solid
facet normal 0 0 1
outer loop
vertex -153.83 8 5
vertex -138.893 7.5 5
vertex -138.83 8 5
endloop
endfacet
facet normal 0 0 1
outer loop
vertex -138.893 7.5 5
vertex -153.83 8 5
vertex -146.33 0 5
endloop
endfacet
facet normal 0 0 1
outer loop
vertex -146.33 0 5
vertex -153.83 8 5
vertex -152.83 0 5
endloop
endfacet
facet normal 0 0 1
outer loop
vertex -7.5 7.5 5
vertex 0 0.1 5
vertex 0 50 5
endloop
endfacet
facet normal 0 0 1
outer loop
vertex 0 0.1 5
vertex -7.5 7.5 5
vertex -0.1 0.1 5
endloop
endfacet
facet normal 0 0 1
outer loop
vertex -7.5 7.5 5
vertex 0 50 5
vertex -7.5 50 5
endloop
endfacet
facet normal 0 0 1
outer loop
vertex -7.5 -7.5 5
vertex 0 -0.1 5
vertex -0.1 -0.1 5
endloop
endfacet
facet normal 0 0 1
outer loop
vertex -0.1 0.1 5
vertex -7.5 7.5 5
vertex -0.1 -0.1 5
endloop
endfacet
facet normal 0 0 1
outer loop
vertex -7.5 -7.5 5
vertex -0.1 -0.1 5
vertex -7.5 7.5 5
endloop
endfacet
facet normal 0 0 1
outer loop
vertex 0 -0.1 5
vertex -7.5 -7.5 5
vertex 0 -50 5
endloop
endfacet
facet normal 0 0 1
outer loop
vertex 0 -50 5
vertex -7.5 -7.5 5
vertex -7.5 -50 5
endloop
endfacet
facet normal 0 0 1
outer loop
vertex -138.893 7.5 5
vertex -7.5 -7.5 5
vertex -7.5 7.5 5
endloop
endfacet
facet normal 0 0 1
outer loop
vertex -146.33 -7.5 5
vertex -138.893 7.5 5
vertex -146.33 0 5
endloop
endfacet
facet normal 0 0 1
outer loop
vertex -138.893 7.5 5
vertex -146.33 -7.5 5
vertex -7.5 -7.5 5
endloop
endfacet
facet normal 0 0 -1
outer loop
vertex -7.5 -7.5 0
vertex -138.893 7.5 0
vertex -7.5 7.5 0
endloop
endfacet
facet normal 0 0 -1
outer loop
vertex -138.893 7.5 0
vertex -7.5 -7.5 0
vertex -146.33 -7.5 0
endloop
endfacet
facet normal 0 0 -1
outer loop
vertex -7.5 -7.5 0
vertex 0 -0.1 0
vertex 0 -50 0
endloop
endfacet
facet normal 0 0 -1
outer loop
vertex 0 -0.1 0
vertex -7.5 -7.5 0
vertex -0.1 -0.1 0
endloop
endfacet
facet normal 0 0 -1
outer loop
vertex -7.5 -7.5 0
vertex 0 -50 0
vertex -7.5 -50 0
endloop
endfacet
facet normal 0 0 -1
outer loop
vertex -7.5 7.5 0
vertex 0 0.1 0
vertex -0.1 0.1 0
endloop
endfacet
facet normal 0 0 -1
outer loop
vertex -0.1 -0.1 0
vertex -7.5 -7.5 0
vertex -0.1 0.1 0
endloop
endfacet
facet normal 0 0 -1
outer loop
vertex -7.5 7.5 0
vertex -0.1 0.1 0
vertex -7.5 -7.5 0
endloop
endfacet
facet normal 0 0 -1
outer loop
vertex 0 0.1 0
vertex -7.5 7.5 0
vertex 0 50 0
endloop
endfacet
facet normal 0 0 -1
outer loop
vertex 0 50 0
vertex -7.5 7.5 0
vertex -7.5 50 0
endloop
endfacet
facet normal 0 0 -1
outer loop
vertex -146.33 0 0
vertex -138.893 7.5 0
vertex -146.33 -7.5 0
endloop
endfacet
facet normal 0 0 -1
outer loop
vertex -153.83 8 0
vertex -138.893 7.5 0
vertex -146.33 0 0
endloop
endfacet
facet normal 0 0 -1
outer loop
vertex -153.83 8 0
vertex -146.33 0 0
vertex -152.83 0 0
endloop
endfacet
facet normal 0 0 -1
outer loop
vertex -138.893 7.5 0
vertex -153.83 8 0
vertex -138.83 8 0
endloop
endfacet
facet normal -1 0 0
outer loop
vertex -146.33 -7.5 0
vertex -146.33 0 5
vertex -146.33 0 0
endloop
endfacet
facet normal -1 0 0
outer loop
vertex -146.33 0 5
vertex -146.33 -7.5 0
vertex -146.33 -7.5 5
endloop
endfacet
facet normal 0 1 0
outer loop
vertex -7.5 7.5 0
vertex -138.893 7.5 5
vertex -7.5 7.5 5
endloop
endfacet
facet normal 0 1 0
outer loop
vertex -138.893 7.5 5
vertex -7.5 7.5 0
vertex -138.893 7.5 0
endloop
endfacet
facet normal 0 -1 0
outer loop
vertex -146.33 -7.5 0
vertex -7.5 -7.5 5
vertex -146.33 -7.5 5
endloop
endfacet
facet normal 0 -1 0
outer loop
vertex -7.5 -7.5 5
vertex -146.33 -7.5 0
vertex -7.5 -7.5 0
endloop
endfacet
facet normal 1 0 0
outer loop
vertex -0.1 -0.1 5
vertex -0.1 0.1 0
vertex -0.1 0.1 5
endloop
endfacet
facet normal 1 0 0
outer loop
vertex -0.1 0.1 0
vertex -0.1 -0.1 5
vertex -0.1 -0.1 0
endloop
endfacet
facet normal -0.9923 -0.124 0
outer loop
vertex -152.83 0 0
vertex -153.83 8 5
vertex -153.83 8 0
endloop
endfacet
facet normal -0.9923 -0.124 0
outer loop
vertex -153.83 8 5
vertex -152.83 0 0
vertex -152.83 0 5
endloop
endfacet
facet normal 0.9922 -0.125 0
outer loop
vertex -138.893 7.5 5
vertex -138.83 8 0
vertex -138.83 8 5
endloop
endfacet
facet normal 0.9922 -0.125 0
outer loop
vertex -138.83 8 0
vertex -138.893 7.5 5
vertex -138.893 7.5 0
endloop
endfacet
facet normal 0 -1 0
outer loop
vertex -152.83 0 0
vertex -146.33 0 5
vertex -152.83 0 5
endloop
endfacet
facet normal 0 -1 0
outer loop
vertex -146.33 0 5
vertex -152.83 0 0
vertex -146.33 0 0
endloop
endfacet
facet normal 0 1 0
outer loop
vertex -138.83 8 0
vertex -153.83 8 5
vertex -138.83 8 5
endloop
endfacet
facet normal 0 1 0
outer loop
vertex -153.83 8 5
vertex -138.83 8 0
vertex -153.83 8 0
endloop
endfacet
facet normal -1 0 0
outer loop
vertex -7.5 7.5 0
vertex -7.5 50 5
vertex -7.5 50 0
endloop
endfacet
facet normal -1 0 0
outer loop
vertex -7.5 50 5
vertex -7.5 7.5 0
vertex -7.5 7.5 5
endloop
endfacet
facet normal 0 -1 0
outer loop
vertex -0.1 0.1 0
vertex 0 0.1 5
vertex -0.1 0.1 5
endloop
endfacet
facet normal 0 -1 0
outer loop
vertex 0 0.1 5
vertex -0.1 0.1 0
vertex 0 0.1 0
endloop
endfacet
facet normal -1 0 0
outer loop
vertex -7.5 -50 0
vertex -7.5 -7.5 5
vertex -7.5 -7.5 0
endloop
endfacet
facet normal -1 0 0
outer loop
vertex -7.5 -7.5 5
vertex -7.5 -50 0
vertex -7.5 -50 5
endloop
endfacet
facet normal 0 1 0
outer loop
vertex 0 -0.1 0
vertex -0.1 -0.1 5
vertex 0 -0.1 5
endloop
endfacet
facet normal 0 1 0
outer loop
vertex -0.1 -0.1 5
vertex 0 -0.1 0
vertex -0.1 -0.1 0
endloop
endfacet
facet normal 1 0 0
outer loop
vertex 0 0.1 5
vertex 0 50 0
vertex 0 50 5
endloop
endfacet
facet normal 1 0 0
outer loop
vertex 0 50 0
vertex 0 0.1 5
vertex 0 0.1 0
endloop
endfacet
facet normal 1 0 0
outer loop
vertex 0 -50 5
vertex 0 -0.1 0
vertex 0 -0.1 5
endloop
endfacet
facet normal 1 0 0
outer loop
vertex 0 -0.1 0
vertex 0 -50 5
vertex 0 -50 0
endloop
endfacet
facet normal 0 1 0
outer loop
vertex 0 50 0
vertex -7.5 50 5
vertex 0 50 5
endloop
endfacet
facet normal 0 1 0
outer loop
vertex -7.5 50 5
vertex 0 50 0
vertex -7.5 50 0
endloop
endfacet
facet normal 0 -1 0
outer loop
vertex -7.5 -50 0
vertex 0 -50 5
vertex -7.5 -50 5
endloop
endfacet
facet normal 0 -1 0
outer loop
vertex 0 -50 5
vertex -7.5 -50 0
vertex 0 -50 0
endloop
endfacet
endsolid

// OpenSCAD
// file: ../src/model_a_cross_brace.scad
// ============================================
// PiCanvas - 모델 A: 십자 보강재
// ============================================

// --- 공통 파라미터 (center_bracket과 동일) ---
bracket_size = 70;
bracket_thickness = 5;

// LCD 디스플레이
lcd_w = 350.66;
lcd_h = 216.25;
lcd_d = 3.2;

// 프레임
frame_bezel = 3;        // 전면 오버랩
frame_wall = 6;         // 프레임 벽 두께
frame_inner_w = lcd_w;
frame_inner_h = lcd_h;
frame_outer_w = lcd_w + frame_wall * 2;
frame_outer_h = lcd_h + frame_wall * 2;

// 십자 보강재
cross_bar_width = 15;     // 바 너비
cross_bar_thickness = bracket_thickness;  // 브라켓과 동일 두께

// 도브테일 파라미터 (center_bracket과 맞춤)
dt_width = 15;
dt_depth = 8;
dt_taper = 1;  // 사다리꼴 기울기

// --- 모듈 ---

// 도브테일 암 (center_bracket 쪽 연결)
module dovetail_female(height) {
    clearance = 0.2;  // 끼워맞춤 여유
    linear_extrude(height = height)
        polygon([
            [-(dt_width/2 - dt_taper) - clearance, 0],
            [(dt_width/2 - dt_taper) + clearance, 0],
            [dt_width/2 + clearance, dt_depth + clearance],
            [-dt_width/2 - clearance, dt_depth + clearance]
        ]);
}

// 프레임 연결용 도브테일 수 (끝단)
module dovetail_male_end() {
    linear_extrude(height = cross_bar_thickness)
        polygon([
            [-dt_width/2 + dt_taper, 0],
            [dt_width/2 - dt_taper, 0],
            [dt_width/2, dt_depth],
            [-dt_width/2, dt_depth]
        ]);
}

// 수평 바 (좌우, X축 방향)
module horizontal_bar() {
    bar_length_half = frame_outer_w / 2 - bracket_size / 2;

    // 오른쪽 바
    module half_bar() {
        difference() {
            translate([0, -cross_bar_width/2, 0])
                cube([bar_length_half, cross_bar_width, cross_bar_thickness]);

            // 중앙 브라켓 도브테일 암 (빼기)
            translate([0, 0, 0])
                rotate([0, 0, -90])
                    translate([-dt_width/2 - 0.1, -dt_depth - 0.1, -0.5])
                        cube([dt_width + 0.2, dt_depth + 0.2, cross_bar_thickness + 1]);
        }

        // 프레임 연결 도브테일 (끝단)
        translate([bar_length_half, 0, 0])
            dovetail_male_end();
    }

    // 오른쪽
    half_bar();

    // 왼쪽 (미러)
    mirror([1, 0, 0])
        half_bar();
}

// 수직 바 (상하, Y축 방향)
module vertical_bar() {
    bar_length_half = frame_outer_h / 2 - bracket_size / 2;

    module half_bar() {
        difference() {
            translate([-cross_bar_width/2, 0, 0])
                cube([cross_bar_width, bar_length_half, cross_bar_thickness]);

            // 중앙 브라켓 도브테일 암 (빼기)
            translate([0, 0, 0])
                rotate([0, 0, 0])
                    translate([-dt_width/2 - 0.1, -dt_depth - 0.1, -0.5])
                        cube([dt_width + 0.2, dt_depth + 0.2, cross_bar_thickness + 1]);
        }

        // 프레임 연결 도브테일 (끝단)
        translate([0, bar_length_half, 0])
            rotate([0, 0, 90])
                dovetail_male_end();
    }

    // 위쪽
    half_bar();

    // 아래쪽 (미러)
    mirror([0, 1, 0])
        half_bar();
}

// --- 메인 ---

module model_a_cross_brace() {
    color("CadetBlue") {
        horizontal_bar();
        vertical_bar();
    }
}

model_a_cross_brace();

// 디버그: 중앙 브라켓 외형 (투명)
%translate([-bracket_size/2, -bracket_size/2, 0])
    cube([bracket_size, bracket_size, bracket_thickness]);

// 디버그: 프레임 외형 (투명)
%translate([-frame_outer_w/2, -frame_outer_h/2, 0])
    difference() {
        cube([frame_outer_w, frame_outer_h, 1]);
        translate([frame_wall, frame_wall, -0.5])
            cube([frame_inner_w, frame_inner_h, 2]);
    }
// main file
// ============================================
// Plate 3: 십자 보강재 - 수평 좌측 반쪽
// 크기: ~146 x 15 mm (OK)
// ============================================
use <../src/model_a_cross_brace.scad>

lcd_w = 350.66;
frame_wall = 6;
frame_outer_w = lcd_w + frame_wall * 2;

intersection() {
    model_a_cross_brace();
    translate([-frame_outer_w, -50, -1])
        cube([frame_outer_w, 100, 20]);
}
